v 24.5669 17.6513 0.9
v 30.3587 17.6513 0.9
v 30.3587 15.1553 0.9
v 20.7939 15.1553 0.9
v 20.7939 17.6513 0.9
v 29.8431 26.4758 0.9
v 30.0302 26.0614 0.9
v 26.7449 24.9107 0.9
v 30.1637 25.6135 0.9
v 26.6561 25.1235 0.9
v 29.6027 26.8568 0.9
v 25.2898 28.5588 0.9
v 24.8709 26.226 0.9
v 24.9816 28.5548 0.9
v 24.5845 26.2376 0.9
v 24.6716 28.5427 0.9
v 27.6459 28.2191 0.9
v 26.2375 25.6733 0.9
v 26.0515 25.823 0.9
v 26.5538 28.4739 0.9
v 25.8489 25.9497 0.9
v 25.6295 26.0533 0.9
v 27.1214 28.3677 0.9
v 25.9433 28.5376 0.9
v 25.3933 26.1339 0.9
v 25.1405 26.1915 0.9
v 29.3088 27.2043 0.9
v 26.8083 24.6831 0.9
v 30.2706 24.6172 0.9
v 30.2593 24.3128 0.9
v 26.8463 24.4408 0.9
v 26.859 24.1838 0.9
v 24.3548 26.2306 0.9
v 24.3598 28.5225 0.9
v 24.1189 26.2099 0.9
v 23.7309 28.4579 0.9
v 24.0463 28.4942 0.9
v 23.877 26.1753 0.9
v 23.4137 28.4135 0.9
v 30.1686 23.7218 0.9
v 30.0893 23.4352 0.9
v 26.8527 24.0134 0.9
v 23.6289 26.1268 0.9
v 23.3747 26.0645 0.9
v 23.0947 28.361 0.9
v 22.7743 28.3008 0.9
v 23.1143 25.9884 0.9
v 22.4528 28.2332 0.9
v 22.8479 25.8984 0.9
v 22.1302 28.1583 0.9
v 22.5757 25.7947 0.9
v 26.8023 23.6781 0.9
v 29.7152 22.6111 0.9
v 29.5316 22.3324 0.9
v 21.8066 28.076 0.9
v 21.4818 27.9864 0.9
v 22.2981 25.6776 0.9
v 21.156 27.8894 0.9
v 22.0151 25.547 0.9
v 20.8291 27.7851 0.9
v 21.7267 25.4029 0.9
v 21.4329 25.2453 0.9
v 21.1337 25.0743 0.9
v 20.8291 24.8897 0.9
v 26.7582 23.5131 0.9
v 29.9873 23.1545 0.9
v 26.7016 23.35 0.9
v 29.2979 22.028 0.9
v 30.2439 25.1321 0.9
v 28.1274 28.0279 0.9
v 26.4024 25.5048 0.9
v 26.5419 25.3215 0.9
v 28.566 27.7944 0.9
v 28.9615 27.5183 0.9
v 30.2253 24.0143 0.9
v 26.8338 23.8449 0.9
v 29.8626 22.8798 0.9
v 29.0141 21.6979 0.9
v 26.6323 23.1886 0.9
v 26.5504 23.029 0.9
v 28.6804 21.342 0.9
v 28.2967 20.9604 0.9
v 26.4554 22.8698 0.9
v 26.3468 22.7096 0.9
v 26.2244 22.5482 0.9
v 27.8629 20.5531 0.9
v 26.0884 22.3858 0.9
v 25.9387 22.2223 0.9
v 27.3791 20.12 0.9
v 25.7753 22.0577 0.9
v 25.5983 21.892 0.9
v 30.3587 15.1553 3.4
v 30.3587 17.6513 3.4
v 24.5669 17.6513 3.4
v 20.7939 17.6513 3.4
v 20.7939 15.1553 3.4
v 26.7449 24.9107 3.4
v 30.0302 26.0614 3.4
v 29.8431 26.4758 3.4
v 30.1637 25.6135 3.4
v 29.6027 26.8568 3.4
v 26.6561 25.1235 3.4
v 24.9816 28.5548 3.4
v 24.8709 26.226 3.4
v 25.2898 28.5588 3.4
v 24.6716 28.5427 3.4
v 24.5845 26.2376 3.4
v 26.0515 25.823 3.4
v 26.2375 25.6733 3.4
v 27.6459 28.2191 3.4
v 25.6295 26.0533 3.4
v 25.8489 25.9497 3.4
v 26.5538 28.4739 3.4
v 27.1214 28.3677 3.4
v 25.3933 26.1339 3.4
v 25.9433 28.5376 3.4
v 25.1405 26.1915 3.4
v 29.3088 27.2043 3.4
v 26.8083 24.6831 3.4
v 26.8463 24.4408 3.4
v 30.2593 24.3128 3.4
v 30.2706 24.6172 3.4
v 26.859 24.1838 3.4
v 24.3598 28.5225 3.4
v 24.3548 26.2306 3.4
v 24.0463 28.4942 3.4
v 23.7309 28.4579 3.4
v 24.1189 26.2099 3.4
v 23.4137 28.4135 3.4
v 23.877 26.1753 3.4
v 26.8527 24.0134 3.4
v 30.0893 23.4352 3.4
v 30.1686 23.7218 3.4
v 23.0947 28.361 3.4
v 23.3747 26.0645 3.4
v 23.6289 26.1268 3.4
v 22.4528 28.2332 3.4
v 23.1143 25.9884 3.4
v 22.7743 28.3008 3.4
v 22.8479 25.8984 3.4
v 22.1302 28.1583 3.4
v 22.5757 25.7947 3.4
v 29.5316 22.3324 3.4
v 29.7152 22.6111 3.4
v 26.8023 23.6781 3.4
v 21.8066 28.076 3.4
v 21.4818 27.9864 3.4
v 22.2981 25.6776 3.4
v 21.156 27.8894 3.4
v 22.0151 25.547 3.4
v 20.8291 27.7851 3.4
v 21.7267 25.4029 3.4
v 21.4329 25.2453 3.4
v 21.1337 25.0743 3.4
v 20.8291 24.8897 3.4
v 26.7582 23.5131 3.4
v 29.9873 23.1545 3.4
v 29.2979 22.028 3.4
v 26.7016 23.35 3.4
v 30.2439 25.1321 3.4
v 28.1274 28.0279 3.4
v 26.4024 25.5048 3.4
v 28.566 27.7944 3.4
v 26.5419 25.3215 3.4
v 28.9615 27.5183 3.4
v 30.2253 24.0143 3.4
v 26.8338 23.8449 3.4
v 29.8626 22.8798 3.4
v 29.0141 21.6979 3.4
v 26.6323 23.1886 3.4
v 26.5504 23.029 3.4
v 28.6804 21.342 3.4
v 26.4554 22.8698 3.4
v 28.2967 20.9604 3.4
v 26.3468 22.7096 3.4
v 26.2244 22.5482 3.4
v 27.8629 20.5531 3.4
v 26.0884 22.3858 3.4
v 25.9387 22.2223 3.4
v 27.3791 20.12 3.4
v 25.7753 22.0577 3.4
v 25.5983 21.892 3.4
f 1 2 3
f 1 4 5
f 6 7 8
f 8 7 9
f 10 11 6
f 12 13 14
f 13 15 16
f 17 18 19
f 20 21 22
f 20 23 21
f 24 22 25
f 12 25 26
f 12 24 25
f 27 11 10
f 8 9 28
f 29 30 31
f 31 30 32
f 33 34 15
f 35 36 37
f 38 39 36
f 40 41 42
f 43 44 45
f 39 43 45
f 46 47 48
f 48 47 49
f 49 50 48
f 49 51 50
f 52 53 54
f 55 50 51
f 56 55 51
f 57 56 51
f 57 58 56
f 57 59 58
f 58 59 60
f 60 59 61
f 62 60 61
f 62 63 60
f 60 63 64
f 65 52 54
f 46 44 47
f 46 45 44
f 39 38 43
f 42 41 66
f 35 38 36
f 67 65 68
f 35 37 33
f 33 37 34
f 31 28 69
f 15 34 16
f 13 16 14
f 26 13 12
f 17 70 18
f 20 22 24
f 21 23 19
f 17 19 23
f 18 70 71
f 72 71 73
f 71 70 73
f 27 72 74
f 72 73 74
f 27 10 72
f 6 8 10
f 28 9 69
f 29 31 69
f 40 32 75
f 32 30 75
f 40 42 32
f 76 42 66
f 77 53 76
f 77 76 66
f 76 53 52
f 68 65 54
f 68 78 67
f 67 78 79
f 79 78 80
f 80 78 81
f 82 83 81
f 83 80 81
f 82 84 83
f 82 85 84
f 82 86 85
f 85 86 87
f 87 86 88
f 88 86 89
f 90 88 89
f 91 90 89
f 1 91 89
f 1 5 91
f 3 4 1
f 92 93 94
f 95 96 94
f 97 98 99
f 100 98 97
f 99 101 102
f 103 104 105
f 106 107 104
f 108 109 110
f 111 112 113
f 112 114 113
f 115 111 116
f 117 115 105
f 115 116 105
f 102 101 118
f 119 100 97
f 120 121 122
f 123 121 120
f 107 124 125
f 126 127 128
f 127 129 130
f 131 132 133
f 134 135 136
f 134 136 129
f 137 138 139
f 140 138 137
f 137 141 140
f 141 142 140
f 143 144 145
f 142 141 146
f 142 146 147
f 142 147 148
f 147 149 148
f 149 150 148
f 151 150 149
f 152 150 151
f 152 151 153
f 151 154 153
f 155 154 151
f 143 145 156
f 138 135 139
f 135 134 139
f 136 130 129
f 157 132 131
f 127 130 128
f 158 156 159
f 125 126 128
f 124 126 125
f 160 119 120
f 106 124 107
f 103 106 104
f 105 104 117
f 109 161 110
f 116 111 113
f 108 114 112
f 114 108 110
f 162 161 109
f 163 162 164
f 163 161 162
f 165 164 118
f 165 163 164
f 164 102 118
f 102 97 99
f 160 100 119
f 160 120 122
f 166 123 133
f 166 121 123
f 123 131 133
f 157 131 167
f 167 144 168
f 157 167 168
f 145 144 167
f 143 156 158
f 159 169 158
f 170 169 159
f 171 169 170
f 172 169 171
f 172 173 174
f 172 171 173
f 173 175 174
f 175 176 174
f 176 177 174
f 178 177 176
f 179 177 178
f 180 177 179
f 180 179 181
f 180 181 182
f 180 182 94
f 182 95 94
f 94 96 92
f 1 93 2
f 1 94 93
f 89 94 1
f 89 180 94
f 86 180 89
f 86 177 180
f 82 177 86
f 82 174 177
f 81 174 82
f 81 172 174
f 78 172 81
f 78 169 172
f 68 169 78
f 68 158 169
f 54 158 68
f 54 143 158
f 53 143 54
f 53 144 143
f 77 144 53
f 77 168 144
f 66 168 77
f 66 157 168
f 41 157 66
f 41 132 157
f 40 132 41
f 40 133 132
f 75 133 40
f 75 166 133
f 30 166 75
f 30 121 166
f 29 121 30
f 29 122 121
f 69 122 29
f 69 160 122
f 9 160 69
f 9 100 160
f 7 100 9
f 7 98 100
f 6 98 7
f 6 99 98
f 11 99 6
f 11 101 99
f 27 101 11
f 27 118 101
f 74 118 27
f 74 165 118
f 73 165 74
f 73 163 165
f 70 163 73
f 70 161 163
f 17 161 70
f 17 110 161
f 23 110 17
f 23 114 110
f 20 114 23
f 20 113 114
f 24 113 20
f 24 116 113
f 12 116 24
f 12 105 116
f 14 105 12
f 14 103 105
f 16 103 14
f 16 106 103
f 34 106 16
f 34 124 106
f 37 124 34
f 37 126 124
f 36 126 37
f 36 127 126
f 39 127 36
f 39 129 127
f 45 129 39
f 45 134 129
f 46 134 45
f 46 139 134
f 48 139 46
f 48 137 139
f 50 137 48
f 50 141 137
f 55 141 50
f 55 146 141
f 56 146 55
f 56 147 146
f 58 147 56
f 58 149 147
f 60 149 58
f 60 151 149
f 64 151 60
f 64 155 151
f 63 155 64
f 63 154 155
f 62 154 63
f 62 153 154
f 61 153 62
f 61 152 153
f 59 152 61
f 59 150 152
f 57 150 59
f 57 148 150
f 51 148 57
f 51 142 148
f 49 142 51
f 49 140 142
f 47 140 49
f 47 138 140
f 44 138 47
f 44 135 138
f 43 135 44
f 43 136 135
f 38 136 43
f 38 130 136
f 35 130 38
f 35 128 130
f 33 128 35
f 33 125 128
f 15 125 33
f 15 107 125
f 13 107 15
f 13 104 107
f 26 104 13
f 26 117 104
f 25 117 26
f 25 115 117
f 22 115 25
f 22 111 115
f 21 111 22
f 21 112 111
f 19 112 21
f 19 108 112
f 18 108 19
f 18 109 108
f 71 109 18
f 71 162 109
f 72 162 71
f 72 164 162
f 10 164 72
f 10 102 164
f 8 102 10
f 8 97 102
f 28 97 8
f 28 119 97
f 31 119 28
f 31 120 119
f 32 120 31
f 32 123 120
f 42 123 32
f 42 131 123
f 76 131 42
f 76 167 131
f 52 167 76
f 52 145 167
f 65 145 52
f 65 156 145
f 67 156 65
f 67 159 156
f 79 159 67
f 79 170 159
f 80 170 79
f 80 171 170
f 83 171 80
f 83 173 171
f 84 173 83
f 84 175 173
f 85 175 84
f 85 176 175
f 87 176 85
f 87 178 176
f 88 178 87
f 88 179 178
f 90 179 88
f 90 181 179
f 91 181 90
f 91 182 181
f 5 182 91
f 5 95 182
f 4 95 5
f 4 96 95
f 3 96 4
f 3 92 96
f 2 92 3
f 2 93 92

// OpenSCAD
$fn = 48;
  translate([25.500, 21.700, 0.900])
    linear_extrude(height=2.500)
      text("2", size=13.000, halign="center", valign="center", font="Helvetica Neue:style=Bold");
